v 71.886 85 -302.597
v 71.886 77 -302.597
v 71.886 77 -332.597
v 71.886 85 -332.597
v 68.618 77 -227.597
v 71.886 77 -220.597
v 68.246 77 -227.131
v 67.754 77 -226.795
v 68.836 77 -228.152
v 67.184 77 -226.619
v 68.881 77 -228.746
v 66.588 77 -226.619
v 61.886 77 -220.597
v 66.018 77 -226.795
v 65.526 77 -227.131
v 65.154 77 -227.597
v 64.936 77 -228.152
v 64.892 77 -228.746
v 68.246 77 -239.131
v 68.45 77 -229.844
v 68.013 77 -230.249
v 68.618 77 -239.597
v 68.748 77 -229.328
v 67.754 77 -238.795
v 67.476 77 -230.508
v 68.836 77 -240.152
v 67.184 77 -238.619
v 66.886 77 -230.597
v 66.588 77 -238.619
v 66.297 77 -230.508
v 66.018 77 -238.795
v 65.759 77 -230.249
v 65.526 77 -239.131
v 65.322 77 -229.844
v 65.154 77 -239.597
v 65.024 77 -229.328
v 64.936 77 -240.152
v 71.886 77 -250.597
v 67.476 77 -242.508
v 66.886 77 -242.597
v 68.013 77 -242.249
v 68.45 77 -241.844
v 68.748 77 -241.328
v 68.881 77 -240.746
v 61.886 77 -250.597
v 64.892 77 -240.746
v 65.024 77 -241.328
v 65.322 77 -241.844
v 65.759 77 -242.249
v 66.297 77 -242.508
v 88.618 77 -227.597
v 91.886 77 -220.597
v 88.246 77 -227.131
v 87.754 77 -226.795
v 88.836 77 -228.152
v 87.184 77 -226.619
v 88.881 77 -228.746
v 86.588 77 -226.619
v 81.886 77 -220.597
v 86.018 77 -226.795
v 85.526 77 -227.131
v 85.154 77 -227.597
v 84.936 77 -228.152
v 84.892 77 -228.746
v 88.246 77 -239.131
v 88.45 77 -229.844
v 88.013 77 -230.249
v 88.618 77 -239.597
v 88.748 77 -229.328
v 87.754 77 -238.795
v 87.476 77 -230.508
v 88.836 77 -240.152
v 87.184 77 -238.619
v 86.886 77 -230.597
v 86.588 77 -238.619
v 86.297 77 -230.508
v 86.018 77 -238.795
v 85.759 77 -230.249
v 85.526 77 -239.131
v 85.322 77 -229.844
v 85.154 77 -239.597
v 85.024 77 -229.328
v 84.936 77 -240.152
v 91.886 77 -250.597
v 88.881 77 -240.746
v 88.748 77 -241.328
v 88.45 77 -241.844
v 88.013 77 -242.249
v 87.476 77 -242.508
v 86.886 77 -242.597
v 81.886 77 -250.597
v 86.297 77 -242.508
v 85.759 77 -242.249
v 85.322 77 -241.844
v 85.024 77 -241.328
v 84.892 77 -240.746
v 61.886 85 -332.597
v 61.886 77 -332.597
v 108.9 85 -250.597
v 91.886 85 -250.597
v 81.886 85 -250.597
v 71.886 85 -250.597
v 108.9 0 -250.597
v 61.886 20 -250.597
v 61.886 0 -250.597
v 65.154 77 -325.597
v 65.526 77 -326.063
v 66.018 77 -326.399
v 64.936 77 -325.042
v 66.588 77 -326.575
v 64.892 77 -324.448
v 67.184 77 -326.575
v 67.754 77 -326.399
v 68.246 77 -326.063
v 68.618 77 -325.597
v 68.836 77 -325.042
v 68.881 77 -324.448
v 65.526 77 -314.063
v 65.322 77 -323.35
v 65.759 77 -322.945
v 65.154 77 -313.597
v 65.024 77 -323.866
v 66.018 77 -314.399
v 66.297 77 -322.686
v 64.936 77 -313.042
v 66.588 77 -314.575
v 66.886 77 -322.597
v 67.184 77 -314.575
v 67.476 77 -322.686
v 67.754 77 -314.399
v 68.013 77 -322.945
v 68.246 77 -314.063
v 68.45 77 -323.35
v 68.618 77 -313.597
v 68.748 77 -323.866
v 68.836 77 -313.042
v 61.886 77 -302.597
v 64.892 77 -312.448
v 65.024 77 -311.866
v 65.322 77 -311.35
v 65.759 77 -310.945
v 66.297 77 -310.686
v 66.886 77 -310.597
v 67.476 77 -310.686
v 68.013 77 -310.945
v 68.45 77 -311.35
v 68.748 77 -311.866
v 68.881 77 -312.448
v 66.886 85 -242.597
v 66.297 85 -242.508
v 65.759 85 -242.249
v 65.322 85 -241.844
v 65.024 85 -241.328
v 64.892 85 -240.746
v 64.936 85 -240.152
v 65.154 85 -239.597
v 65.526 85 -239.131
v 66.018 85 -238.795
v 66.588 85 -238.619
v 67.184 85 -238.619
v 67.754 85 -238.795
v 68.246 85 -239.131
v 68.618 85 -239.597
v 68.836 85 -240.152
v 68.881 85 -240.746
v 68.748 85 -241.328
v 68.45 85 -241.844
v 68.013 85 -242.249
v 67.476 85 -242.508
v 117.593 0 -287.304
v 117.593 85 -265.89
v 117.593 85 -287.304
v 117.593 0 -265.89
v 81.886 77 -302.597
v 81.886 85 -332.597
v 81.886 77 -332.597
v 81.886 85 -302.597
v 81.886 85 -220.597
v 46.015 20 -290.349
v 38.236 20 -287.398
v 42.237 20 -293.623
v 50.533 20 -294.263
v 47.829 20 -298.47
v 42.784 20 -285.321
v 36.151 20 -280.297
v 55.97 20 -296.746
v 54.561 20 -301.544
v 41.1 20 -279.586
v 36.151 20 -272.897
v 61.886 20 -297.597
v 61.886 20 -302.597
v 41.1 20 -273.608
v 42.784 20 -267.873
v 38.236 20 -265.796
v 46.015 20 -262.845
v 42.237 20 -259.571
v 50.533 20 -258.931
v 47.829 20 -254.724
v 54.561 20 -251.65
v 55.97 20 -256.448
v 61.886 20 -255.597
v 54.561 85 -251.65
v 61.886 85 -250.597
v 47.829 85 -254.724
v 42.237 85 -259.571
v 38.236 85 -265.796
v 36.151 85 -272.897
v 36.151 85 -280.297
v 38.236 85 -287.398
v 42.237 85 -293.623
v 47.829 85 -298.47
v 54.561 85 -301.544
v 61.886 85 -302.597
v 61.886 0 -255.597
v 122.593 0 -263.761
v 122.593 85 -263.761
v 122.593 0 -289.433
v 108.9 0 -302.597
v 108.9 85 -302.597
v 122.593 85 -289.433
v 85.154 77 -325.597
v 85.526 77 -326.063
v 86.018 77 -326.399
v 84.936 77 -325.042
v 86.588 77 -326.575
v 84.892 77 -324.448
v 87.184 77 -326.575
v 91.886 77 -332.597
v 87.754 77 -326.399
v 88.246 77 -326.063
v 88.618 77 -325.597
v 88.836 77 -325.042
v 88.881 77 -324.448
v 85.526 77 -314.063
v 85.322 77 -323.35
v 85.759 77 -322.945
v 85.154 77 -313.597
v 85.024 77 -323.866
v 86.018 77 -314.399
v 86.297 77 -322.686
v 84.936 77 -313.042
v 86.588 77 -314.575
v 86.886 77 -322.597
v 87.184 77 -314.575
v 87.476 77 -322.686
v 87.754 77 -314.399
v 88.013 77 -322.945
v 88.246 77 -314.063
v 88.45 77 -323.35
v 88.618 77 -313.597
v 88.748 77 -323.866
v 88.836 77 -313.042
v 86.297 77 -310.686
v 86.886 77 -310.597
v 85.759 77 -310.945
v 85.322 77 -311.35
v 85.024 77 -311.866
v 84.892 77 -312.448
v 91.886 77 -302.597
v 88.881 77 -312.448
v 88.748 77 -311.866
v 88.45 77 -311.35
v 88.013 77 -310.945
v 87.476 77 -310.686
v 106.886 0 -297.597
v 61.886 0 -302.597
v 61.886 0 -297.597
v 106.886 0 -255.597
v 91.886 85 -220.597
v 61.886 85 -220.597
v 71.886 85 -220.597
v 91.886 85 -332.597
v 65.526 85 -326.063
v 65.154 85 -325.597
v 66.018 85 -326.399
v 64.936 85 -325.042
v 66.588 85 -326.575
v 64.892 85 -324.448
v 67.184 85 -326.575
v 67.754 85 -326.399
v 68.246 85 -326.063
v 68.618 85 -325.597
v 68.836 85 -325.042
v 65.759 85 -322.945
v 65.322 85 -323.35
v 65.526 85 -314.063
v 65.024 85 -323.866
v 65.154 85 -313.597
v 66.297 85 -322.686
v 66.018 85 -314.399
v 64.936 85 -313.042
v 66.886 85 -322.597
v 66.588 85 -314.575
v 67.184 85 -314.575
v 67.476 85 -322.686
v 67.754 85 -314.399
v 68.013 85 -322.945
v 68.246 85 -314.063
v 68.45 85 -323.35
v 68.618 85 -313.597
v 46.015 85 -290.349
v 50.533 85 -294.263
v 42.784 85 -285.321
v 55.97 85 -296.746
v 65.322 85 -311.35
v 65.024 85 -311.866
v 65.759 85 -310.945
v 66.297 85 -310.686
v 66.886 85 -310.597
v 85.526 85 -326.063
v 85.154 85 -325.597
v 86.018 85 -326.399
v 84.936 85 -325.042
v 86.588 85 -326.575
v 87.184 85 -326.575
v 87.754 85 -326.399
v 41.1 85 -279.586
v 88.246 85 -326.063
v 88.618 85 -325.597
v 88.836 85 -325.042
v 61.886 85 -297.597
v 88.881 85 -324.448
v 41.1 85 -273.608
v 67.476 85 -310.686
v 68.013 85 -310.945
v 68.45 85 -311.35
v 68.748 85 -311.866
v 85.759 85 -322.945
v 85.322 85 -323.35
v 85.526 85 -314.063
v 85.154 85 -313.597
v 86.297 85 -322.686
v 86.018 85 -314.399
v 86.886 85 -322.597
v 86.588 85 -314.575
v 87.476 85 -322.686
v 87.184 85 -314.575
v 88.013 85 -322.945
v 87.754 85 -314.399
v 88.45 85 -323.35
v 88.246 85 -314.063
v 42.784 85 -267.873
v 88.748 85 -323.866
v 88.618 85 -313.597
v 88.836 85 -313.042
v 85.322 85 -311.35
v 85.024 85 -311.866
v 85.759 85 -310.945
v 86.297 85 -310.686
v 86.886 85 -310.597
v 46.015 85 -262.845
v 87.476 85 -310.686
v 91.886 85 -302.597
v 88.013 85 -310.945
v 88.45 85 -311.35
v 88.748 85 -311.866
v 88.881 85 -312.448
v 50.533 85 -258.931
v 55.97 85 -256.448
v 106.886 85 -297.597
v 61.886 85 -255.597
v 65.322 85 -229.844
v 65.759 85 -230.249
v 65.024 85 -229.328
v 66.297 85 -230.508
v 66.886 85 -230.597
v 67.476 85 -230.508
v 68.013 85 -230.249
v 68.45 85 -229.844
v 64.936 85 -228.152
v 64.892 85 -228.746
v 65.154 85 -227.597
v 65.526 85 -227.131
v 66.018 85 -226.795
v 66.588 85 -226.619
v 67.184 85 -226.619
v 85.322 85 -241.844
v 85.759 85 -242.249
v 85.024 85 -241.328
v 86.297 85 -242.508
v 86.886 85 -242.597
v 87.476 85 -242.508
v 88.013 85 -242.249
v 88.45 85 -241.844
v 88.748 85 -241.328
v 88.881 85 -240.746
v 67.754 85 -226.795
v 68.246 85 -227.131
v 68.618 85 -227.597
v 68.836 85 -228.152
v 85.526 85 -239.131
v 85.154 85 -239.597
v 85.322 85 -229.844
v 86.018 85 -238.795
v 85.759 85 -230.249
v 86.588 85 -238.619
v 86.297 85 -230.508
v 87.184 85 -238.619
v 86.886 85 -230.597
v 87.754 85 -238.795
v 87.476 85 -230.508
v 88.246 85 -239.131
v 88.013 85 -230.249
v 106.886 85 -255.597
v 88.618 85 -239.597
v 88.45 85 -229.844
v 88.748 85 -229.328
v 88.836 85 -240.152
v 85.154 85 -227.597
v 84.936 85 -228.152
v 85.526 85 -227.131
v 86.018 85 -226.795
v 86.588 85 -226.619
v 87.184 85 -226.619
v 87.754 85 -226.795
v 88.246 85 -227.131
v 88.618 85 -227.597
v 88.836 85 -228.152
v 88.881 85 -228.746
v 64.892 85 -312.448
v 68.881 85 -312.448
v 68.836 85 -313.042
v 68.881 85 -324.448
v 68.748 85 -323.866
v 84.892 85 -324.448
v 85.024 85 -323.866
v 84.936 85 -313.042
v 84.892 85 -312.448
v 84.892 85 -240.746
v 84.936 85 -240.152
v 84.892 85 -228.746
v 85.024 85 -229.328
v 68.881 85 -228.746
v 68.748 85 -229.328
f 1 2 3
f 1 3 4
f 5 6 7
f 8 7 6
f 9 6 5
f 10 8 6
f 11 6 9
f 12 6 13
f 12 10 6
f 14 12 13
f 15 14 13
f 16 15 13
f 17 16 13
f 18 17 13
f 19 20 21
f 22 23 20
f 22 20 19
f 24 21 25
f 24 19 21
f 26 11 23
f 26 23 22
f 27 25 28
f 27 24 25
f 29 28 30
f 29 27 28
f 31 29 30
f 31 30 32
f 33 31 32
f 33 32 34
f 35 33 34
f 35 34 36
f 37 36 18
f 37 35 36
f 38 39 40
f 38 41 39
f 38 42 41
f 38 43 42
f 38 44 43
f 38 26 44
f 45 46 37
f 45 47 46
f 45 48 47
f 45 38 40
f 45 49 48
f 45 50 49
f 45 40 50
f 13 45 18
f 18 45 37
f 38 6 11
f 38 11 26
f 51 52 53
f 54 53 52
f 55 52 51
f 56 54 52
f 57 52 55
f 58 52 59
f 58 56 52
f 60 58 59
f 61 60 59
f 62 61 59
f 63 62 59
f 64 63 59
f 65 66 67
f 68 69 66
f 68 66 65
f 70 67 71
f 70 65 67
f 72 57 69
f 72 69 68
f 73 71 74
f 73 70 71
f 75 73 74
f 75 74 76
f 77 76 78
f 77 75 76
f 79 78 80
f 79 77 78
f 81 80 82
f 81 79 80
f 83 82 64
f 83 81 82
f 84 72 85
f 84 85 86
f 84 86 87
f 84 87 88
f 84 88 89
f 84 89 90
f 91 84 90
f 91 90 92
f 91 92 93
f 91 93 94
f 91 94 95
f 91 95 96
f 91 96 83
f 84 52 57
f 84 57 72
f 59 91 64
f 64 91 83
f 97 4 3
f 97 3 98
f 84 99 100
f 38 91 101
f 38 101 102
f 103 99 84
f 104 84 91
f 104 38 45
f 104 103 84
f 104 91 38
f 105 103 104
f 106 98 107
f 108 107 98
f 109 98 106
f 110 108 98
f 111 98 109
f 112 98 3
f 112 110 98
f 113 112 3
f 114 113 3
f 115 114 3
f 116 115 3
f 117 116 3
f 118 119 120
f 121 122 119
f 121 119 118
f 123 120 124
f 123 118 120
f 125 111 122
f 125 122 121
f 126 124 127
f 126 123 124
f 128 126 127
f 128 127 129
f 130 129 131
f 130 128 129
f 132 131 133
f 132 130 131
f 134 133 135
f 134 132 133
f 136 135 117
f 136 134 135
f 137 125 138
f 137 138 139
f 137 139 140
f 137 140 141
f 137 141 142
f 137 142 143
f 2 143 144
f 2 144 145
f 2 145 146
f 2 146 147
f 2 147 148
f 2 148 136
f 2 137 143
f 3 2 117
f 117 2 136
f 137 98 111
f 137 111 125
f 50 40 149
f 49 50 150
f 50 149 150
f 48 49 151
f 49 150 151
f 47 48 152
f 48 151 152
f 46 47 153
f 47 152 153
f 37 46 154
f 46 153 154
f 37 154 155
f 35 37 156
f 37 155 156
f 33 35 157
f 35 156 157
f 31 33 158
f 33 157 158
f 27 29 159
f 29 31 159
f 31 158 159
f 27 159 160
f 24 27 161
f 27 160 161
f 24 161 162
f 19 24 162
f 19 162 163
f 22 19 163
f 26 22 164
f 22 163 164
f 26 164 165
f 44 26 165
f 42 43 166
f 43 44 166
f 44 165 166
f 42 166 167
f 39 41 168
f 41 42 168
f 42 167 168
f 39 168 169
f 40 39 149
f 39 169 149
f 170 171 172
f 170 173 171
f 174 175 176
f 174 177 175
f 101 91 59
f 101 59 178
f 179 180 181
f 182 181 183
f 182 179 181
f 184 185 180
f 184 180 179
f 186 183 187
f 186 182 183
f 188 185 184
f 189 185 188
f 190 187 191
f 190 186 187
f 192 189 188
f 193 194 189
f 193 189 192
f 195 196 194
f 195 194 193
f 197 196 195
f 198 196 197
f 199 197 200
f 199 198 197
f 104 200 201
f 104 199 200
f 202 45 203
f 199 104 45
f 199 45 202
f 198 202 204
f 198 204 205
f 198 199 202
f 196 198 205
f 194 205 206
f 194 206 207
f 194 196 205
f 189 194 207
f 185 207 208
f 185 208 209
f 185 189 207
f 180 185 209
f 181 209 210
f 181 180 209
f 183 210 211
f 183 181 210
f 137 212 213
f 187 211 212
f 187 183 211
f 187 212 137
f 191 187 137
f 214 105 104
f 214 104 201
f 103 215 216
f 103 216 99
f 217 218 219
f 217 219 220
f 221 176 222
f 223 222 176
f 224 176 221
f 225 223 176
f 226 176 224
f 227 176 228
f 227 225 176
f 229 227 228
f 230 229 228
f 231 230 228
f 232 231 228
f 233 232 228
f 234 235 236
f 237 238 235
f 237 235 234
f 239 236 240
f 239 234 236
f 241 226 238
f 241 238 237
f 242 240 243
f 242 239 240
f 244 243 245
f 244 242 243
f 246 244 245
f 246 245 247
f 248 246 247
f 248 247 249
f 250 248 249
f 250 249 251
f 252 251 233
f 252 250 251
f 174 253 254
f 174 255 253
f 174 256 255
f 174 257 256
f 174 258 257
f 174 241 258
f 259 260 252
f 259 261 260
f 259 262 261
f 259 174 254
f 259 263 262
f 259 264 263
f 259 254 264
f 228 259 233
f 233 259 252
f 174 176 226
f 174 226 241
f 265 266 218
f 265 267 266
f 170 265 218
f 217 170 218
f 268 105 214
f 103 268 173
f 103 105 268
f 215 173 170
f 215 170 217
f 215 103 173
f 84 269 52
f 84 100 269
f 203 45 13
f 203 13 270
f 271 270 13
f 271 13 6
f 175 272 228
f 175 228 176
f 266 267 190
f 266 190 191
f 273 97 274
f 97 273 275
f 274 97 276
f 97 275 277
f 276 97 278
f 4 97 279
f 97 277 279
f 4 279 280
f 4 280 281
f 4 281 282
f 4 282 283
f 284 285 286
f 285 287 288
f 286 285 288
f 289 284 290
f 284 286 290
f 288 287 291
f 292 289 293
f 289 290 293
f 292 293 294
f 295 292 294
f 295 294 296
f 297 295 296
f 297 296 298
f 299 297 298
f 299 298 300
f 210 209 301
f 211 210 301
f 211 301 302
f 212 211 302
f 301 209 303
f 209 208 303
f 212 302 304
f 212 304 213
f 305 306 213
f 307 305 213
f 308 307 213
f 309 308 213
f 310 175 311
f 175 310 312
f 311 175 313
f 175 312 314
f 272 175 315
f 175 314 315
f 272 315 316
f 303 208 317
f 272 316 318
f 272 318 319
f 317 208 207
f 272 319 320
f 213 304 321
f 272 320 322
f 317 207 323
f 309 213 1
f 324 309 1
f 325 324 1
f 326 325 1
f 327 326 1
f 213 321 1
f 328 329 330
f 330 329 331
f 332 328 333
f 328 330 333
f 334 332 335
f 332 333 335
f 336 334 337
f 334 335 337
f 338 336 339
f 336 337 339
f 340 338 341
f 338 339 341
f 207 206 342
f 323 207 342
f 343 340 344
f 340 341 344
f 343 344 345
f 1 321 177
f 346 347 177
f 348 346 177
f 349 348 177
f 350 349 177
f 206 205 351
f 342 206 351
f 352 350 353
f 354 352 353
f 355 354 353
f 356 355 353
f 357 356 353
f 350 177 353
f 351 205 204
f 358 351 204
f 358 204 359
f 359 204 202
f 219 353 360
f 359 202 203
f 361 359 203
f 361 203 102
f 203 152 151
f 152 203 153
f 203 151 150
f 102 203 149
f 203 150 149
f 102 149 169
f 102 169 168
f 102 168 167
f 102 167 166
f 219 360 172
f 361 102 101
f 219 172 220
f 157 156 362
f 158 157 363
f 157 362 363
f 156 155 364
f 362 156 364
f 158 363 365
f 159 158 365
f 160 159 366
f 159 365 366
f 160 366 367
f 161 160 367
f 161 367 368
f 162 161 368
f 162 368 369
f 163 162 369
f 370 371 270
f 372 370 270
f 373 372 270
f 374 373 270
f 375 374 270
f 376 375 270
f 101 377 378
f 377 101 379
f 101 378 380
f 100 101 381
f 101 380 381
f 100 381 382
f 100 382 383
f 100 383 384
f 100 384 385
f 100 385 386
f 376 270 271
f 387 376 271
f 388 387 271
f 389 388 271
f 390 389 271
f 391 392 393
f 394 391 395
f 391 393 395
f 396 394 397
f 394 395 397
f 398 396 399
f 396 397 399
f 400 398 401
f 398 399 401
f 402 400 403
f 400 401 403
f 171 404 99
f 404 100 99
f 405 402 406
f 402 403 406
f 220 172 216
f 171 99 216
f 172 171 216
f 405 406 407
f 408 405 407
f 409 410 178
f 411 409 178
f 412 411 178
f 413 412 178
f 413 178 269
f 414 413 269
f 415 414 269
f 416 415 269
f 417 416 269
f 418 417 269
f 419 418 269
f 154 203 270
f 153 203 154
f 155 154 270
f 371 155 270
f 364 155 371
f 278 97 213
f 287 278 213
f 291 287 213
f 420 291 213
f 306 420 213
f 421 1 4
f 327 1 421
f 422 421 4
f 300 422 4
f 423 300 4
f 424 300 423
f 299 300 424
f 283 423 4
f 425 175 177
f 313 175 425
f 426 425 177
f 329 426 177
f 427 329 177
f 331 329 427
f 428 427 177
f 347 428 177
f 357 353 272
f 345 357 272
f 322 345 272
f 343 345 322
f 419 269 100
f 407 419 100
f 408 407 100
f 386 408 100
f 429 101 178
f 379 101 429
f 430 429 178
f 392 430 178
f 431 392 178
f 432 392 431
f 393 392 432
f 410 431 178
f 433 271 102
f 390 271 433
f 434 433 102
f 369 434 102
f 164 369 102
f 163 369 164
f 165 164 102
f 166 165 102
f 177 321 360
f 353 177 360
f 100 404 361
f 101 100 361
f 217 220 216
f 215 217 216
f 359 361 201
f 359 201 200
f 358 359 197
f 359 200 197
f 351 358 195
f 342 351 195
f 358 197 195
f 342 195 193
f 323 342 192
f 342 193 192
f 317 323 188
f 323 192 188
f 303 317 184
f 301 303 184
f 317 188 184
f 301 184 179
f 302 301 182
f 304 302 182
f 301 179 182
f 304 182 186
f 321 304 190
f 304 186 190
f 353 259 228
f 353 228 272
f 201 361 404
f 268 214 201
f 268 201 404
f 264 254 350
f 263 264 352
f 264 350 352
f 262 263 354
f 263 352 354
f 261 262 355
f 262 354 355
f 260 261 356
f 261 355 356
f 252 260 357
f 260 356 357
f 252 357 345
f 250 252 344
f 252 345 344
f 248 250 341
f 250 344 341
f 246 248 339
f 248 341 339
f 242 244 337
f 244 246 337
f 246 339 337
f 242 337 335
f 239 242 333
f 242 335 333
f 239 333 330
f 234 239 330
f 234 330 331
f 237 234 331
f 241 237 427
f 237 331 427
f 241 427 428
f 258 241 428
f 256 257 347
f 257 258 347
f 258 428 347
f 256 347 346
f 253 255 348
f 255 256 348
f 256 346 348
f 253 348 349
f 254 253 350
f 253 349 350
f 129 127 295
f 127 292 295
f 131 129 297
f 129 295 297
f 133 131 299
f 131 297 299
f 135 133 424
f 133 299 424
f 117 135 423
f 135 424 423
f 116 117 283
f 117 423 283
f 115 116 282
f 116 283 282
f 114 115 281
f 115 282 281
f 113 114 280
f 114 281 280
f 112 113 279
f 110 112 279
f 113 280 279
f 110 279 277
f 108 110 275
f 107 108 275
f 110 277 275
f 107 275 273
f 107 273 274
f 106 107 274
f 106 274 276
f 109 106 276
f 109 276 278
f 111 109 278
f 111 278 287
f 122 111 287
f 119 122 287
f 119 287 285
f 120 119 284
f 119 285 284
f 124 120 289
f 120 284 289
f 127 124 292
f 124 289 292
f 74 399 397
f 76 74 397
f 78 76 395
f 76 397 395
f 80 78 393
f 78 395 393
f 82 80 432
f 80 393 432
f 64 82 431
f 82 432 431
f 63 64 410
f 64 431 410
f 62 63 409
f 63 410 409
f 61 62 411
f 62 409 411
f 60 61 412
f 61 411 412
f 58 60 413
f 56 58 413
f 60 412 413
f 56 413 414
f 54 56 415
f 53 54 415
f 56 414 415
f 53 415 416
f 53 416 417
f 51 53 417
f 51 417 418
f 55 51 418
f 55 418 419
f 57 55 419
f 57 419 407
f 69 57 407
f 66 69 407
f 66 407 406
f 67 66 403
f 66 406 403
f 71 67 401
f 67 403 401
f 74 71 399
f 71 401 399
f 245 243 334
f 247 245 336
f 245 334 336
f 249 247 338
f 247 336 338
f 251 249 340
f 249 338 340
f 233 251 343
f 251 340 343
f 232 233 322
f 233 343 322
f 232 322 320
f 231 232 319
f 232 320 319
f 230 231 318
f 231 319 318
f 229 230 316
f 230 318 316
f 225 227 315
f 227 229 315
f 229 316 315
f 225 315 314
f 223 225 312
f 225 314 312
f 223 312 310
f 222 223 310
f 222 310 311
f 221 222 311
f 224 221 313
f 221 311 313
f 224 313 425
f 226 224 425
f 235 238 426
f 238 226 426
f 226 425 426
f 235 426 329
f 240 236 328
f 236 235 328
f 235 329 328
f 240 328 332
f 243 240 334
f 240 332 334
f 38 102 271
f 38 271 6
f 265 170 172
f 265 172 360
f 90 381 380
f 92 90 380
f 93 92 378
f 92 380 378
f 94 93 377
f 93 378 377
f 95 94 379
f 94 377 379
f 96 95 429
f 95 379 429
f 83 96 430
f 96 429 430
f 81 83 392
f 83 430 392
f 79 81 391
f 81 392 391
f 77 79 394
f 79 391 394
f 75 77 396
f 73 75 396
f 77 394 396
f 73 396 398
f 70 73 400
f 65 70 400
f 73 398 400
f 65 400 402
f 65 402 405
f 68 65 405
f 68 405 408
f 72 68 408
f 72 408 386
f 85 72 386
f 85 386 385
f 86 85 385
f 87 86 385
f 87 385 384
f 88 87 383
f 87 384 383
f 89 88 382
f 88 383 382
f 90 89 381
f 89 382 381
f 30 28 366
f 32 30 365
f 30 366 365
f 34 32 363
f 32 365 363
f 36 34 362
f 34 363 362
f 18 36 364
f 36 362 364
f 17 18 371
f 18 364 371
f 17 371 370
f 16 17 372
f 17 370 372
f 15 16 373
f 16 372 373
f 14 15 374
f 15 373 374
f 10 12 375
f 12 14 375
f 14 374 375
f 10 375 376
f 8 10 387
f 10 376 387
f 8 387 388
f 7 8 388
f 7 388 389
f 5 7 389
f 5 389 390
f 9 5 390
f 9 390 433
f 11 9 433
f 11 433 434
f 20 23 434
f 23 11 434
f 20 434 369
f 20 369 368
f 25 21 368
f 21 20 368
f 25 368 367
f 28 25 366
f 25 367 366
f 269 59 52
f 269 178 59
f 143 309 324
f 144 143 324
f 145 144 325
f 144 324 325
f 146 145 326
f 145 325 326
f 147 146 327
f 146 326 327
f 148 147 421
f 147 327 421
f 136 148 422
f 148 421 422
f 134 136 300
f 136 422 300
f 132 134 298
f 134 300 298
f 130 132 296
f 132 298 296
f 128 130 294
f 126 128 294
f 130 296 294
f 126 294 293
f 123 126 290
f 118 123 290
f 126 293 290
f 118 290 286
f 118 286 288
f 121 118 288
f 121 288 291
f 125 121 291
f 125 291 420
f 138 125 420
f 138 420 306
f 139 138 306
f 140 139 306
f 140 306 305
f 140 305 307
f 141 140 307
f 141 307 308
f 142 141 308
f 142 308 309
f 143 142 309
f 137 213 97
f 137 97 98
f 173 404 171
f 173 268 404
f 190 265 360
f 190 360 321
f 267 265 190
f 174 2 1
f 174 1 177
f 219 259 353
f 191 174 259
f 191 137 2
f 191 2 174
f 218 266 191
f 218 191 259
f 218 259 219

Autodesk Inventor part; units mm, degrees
ref_plane "YZ Plane" through (0, 0, 0) normal (1, 0, 0) x (0, 1, 0)
ref_plane "XZ Plane" through (0, 0, 0) normal (0, 1, 0) x (-1, 0, 0)
ref_plane "XY Plane" through (0, 0, 0) normal (0, 0, 1) x (1, 0, 0)
sketch "Esquisse1" plane through (0, 0, 0) normal (0, 1, 0) x (-1, 0, 0)
  line L0 (-61.8861, -256.597) -> (-116.8861, -256.597)
  line L1 (-116.8861, -256.597) -> (-116.8861, -296.597)
  line L2 (-116.8861, -296.597) -> (-61.8861, -296.597)
  arc A0 (-61.8861, -296.597) -> (-61.8861, -256.597) centre (-61.8861, -276.597) ccw
  dimension "d1" = 40
  dimension "d2" = 55
  dimension "d3" = 55
extrude "Extrusion1" add sketch "Esquisse1" along normal blind 10
sketch "Esquisse3" plane through (0, 0, 0) normal (0, -1, 0) x (1, 0, 0)
  line L0 (89.3861, -269.097) -> (104.3861, -269.097)
  line L1 (104.3861, -269.097) -> (104.3861, -284.097)
  line L2 (104.3861, -284.097) -> (89.3861, -284.097)
  line L3 (89.3861, -284.097) -> (89.3861, -269.097)
  line L4 (116.8861, -296.597) -> (61.8861, -296.597) projected
  line L5 (116.8861, -256.597) -> (116.8861, -296.597) projected
  point P0 (0, 0)
  dimension "d19" = 15
  dimension "d20" = 15
  dimension "d21" = 12.5
  dimension "d22" = 12.5
extrude "Extrusion3" add sketch "Esquisse3" along normal blind 15
chamfer "Chanfrein2" distance 4 angle 45 4 edges at (89.3861, -7.5, -284.097) (104.3861, -7.5, -284.097) (89.3861, -7.5, -269.097) (104.3861, -7.5, -269.097)
sketch "Esquisse4" plane through (0, 10, 0) normal (0, 1, 0) x (1, 0, 0)
  line L0 (116.8861, 296.597) -> (61.8861, 296.597) projected
  arc A0 (61.8861, 296.597) -> (61.8861, 256.597) centre (61.8861, 276.597) ccw projected
  circle A1 centre (61.8861, 276.597) radius 19
  point P0 (0, 0)
  dimension "d28" = 1
extrude "Extrusion4" add sketch "Esquisse4" along normal blind 73
chamfer "Chanfrein3" distance 10 angle 45 2 edges at (116.8861, 5, -256.597) (116.8861, 5, -296.597)
sketch "Esquisse5" plane through (0, 10, 0) normal (0, 1, 0) x (1, 0, 0)
  line L0 (61.8861, 256.597) -> (106.8861, 256.597) projected
  line L1 (106.8861, 296.597) -> (61.8861, 296.597) projected
  arc A0 (97.6044, 288.5312) -> (97.6044, 264.6628) centre (93.8861, 276.597) ccw
  circle A1 centre (61.8861, 276.597) radius 19 projected
  line L2 (116.8861, 266.597) -> (116.8861, 286.597) projected
  line L3 (116.8861, 267.597) -> (116.8861, 285.597)
  line L4 (116.8861, 267.597) -> (93.8861, 264.097)
  line L5 (116.8861, 285.597) -> (93.8861, 289.097)
  point P0 (0, 0)
  dimension "d34" = 25
  dimension "d35" = 32
  dimension "d36" = 1
  dimension "d37" = 1
extrude "Extrusion5" add sketch "Esquisse5" along normal blind 110 contours L5 L2 L4 A0
sketch "Esquisse6" plane through (0, 120, 0) normal (0, 1, 0) x (1, 0, 0)
  line L0 (116.8861, 267.597) -> (93.8861, 264.097) projected
  arc A0 (93.8861, 289.097) -> (93.8861, 264.097) centre (93.8861, 276.597) ccw projected
  line L1 (93.8861, 264.097) -> (93.8861, 264.097)
  circle A1 centre (93.8861, 276.597) radius 10
  point P0 (0, 0)
  dimension "d40" = 20
extrude "Extrusion6" add sketch "Esquisse6" along normal blind 22
ref_plane "Plan de construction1" through (61.8861, 0, -276.597) normal (0, 0, -1) x (-1, 0, 0)
sketch "Esquisse7" plane through (61.8861, 0, -276.597) normal (0, 0, -1) x (-1, 0, 0)
  point P0 (61.8861, 0)
sketch "Esquisse8" plane through (0, 0, 0) normal (0, -1, 0) x (1, 0, 0)
  point P0 (0, 0)
sketch "Esquisse9" plane through (0, 0, 0) normal (0, -1, 0) x (1, 0, 0)
  arc A0 (61.8861, -256.597) -> (61.8861, -296.597) centre (61.8861, -276.597) ccw projected
  line L0 (61.8861, -256.597) -> (106.8861, -256.597) projected
  line L1 (106.8861, -256.597) -> (116.8861, -266.597) projected
  line L2 (116.8861, -266.597) -> (116.8861, -286.597) projected
  line L3 (116.8861, -286.597) -> (106.8861, -296.597) projected
  line L4 (106.8861, -296.597) -> (61.8861, -296.597) projected
  line L5 (61.8861, -256.597) -> (106.8861, -256.597) projected
  line L6 (61.8861, -255.597) -> (106.8861, -255.597)
  line L7 (106.8861, -255.597) -> (117.5932, -265.8899)
  line L8 (117.5932, -265.8899) -> (117.5932, -287.3041)
  line L9 (117.5932, -287.3041) -> (106.8861, -297.597)
  line L10 (106.8861, -297.597) -> (61.8861, -297.597)
  arc A1 (61.8861, -255.597) -> (61.8861, -297.597) centre (61.8861, -276.597) ccw
  line L11 (108.8997, -250.597) -> (61.8861, -250.597)
  arc A2 (61.8861, -250.597) -> (61.8861, -302.597) centre (61.8861, -276.597) ccw
  line L12 (61.8861, -302.597) -> (108.8997, -302.597)
  line L13 (108.8997, -302.597) -> (122.5932, -289.4332)
  line L14 (122.5932, -289.4332) -> (122.5932, -263.7609)
  line L15 (122.5932, -263.7609) -> (108.8997, -250.597)
  point P0 (0, 0)
  dimension "d51" = 1
  dimension "d52" = 1
  dimension "d53" = 1
  dimension "d54" = 5
extrude "Extrusion7" add sketch "Esquisse9" against normal blind 85 contours L15 L14 L13 L12 A2 L11
sketch "Esquisse10" plane through (0, 0, 0) normal (0, -1, 0) x (1, 0, 0)
  line L0 (89.3861, -273.097) -> (89.3861, -280.097) projected
  line L1 (104.3861, -280.097) -> (104.3861, -273.097) projected
  line L2 (61.8861, -302.597) -> (108.8997, -302.597) projected
  line L3 (89.3861, -250.597) -> (89.3861, -263.7609)
  line L4 (89.3861, -302.597) -> (79.3861, -302.597)
  line L5 (79.3861, -302.597) -> (79.3861, -250.597)
  line L6 (122.5932, -263.7609) -> (89.3861, -263.7609)
  line L7 (89.3861, -268.7609) -> (122.5932, -268.7609)
  line L8 (122.5932, -289.4332) -> (89.3861, -289.4332)
  line L9 (89.3861, -284.4332) -> (122.5932, -284.4332)
  line L10 (89.3861, -289.4332) -> (89.3861, -302.597)
  line L11 (89.3861, -268.7609) -> (89.3861, -284.4332)
  line L12 (79.3861, -250.597) -> (89.3861, -250.597)
  line L13 (108.8997, -250.597) -> (61.8861, -250.597) projected
  line L14 (122.5932, -263.7609) -> (122.5932, -268.7609)
  line L15 (122.5932, -284.4332) -> (122.5932, -289.4332)
  point P0 (0, 0)
  dimension "d57" = 10
  dimension "d58" = 5
  dimension "d59" = 5
extrude "Extrusion8" add sketch "Esquisse10" along normal blind 15
sketch "Esquisse11" plane through (0, 85, 0) normal (0, 1, 0) x (1, 0, 0)
  line L0 (116.8861, 286.597) -> (114.0499, 289.4332) projected
  line L1 (116.8861, 286.597) -> (116.8861, 266.597)
  line L2 (61.8861, 256.597) -> (106.8861, 256.597) projected
  line L3 (106.8861, 256.597) -> (61.8861, 256.597)
  line L4 (114.0499, 289.4332) -> (106.8861, 296.597) projected
  line L5 (106.8861, 296.597) -> (61.8861, 296.597)
  line L6 (106.8861, 296.597) -> (61.8861, 296.597) projected
  line L7 (61.8861, 296.597) -> (106.8861, 296.597)
  line L8 (106.8861, 296.597) -> (116.8861, 286.597)
  arc A0 (61.8861, 296.597) -> (61.8861, 256.597) centre (61.8861, 276.597) ccw
  line L9 (114.0499, 263.7609) -> (116.8861, 266.597) projected
  line L10 (116.8861, 266.597) -> (106.8861, 256.597)
  point P0 (0, 0)
extrude "Extrusion9" cut sketch "Esquisse11" against normal blind 85 and the other way blind 42.5
sketch "Esquisse12" plane through (93.8861, 127.5, -276.597) normal (0, -1, 0) x (1, 0, 0)
  point P0 (-93.8861, 276.597)
sketch "Esquisse13" plane through (93.8861, 142, -276.597) normal (0, 1, 0) x (1, 0, 0)
  circle A0 centre (0, 0) radius 10.5
  point P0 (-93.8861, -276.597)
  dimension "d66" = 21
extrude "Extrusion10" cut sketch "Esquisse13" against normal blind 85
sketch "Esquisse14" plane through (0, -15, 0) normal (0, -1, 0) x (1, 0, 0)
  line L0 (89.3861, -284.4332) -> (89.3861, -280.097) projected
  line L1 (89.3861, -268.7609) -> (122.5932, -268.7609) projected
  line L2 (89.3861, -284.4332) -> (113.204, -284.4332)
  line L3 (113.204, -284.4332) -> (113.204, -268.7609)
  line L4 (113.204, -268.7609) -> (89.3861, -268.7609)
  line L5 (89.3861, -268.7609) -> (89.3861, -284.4332)
  point P0 (0, 0)
extrude "Extrusion11" cut sketch "Esquisse14" against normal blind 85
sketch "Esquisse17" plane through (61.8861, 85, -250.597) normal (0, 0, 1) x (1, 0, 0)
  line L0 (0, 0) -> (10, 0)
  line L1 (10, 0) -> (10, -8)
  line L2 (10, -8) -> (0, -8)
  line L3 (0, -8) -> (0, 0)
  line L4 (10, 0) -> (20, 0)
  line L5 (0, 0) -> (47.0135, 0) projected
  line L6 (20, 0) -> (30, 0)
  line L7 (30, 0) -> (30, -8)
  line L8 (30, -8) -> (20, -8)
  line L9 (20, -8) -> (20, 0)
  point P0 (-61.8861, -85)
  dimension "d79" = 10
  dimension "d80" = 8
  dimension "d81" = 10
  dimension "d82" = 10
extrude "Extrusion13" add sketch "Esquisse17" along normal blind 30
sketch "Esquisse18" plane through (81.8861, 77, -250.597) normal (0, -1, 0) x (1, 0, 0)
  line L0 (10, 30) -> (0, 30) projected
  point P0 (-81.8861, 250.597)
  point P1 (5, 22)
  point P2 (5, 10)
ref_plane "Plan de construction2" through (76.8861, 77, -250.597) normal (-1, 0, 0) x (0, 0, 1)
hole "Perçage1" at (86.8861, 77, -240.597) at (86.8861, 77, -228.597) direction (0, 1, 0) diameter 4 end through all
mirror "Symétrie1" about plane through (76.8861, 77, -250.597) normal (-1, 0, 0) of "Perçage1"
mirror "Symétrie2" about plane through (61.8861, 0, -276.597) normal (0, 0, -1) of "Extrusion13", "Perçage1", "Symétrie1"
sketch "Esquisse19" plane through (0, 0, 0) normal (0, -1, 0) x (1, 0, 0)
  line L0 (61.8861, -302.597) -> (79.3861, -302.597) projected
  line L1 (61.8861, -302.597) -> (131.8861, -302.597)
  line L2 (131.8861, -302.597) -> (131.8861, -247.7831)
  line L3 (131.8861, -247.7831) -> (61.8861, -247.7831)
  line L4 (61.8861, -247.7831) -> (61.8861, -302.597)
  point P0 (0, 0)
  point P1 (61.8861, -250.597)
  dimension "d95" = 70
extrude "Extrusion14" cut sketch "Esquisse19" along normal blind 15
sketch "Esquisse20" plane through (0, 0, 0) normal (0, -1, 0) x (1, 0, 0)
  line L0 (61.8861, -250.597) -> (61.8861, -220.597) projected
  arc A0 (61.8861, -255.597) -> (61.8861, -297.597) centre (61.8861, -276.597) ccw projected
  line L1 (61.8861, -250.597) -> (61.8861, -255.597)
  line L2 (61.8861, -297.597) -> (61.8861, -303.2676)
  line L3 (61.8861, -302.597) -> (71.8861, -302.597) projected
  arc A1 (61.8861, -250.597) -> (61.8861, -302.597) centre (61.8861, -276.597) ccw
  arc A2 (61.8861, -255.597) -> (61.8861, -297.597) centre (61.8861, -276.597) ccw
  point P0 (0, 0)
extrude "Extrusion15" cut sketch "Esquisse20" against normal blind 20
equation "\"d93\" = Epaisseur"
equation "\"RayonPli\" = Epaisseur"
equation "\"LargeurGrugeage\" = Epaisseur"
equation "\"ProfondeurGrugeage\" = 0.5 * Epaisseur"
equation "\"TailleGrugeage\" = 4 * Epaisseur"
equation "\"RestesMinimum\" = 2 * Epaisseur"
equation "\"Rayondetransition\" = RayonPli"
equation "\"TailleRayonJacobi\" = Epaisseur"
equation "\"TailleJeu\" = Epaisseur"
equation "\"Epaisseur\" = 0.5"
properties part number "actionneur linéaire"
